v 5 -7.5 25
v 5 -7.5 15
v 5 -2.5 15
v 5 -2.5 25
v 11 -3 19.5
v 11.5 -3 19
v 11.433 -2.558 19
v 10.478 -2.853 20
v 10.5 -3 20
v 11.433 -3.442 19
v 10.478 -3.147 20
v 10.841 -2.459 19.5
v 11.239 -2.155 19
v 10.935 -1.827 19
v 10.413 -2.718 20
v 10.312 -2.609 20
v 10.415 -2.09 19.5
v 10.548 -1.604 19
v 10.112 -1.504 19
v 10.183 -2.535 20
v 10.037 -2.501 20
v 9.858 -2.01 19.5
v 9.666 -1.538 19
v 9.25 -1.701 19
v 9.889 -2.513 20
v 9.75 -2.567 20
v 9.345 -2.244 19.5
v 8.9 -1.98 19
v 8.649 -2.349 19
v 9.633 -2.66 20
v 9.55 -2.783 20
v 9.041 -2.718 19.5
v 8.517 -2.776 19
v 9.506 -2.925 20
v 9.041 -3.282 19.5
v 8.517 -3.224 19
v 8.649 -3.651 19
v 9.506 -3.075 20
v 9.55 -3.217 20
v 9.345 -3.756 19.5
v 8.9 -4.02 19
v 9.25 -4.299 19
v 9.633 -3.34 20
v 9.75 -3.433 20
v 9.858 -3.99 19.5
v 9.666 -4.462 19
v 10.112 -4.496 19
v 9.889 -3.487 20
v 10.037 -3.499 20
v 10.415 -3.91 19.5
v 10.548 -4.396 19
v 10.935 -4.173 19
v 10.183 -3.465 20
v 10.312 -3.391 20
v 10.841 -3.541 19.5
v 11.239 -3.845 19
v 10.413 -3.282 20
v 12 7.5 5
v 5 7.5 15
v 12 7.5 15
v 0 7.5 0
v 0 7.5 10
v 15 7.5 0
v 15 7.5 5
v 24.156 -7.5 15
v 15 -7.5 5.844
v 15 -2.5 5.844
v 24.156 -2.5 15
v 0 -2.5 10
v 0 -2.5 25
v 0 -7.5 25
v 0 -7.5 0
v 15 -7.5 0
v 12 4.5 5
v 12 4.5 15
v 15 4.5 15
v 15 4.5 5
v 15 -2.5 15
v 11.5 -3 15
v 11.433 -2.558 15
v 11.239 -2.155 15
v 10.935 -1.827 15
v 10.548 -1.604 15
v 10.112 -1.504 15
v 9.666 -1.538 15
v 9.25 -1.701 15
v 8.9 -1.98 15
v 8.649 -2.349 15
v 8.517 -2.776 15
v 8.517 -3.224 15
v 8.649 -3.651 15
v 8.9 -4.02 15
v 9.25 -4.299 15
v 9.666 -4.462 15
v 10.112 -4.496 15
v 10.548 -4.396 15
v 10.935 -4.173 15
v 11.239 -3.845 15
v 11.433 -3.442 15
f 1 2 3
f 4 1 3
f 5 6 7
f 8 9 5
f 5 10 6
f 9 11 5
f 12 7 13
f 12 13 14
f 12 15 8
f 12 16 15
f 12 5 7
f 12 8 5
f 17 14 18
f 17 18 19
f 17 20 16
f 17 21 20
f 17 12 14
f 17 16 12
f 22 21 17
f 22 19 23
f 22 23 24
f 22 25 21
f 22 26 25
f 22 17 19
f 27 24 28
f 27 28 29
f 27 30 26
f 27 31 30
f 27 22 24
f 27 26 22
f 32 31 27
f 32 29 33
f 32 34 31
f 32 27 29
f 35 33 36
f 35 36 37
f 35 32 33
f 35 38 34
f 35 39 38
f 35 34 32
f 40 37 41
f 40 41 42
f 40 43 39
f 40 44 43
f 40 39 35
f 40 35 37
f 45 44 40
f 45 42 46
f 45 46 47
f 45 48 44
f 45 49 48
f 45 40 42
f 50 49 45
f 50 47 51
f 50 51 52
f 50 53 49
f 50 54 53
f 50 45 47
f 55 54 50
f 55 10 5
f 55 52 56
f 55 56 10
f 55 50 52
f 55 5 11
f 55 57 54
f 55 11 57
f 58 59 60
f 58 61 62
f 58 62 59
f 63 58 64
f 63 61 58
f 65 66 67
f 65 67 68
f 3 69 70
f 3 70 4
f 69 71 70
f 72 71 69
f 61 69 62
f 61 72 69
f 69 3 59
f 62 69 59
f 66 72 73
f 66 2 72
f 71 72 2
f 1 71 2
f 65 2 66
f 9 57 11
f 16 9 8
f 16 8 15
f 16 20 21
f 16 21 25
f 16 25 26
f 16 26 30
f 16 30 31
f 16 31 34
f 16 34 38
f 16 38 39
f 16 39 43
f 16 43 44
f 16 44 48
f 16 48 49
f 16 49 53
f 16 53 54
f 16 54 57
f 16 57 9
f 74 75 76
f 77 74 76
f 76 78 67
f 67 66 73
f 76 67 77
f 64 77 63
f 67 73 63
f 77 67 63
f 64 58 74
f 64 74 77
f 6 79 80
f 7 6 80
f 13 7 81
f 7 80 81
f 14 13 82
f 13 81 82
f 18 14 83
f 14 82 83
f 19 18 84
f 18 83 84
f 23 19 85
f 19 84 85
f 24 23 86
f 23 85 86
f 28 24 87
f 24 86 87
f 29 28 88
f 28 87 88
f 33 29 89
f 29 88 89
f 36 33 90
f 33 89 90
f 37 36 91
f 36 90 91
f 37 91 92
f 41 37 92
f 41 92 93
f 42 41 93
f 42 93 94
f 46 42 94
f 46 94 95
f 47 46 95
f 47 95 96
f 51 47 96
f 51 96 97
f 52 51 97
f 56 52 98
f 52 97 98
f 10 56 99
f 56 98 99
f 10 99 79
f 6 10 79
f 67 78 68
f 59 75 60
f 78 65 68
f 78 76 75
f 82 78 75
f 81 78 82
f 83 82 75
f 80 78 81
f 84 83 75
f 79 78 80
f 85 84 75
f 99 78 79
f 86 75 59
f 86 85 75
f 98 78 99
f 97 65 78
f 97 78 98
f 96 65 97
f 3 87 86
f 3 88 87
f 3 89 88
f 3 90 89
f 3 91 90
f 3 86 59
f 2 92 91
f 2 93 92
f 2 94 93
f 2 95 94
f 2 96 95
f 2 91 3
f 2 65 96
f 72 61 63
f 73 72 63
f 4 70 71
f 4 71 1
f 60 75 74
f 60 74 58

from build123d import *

# Parameters (mm, degrees)
F0_W     = 15
F0_H     = 15
F1_DEPTH = 15
F2_W     = 5
F2_H     = 5
F3_DEPTH = 10
F2_R     = 1.5
F4_DEPTH = 5
F2_W_2   = 3
F2_H_2   = 3
F5_DEPTH = 10
F6_SIZE  = 5
F8_DEPTH = 5
F9_SIZE  = 1


with BuildPart() as f1:
    # F0 (on Top) → F1 (new body)
    with BuildSketch(Plane.XY):
        with Locations((7.5, 0)):
            Rectangle(F0_W, F0_H)
    extrude(amount=F1_DEPTH)

    # F2 (on face) → F3 (join)
    with BuildSketch(Plane.XY.offset(15)):
        with Locations((2.5, -5)):
            Rectangle(F2_W, F2_H)
    extrude(amount=F3_DEPTH)

    # F2 (on face) → F4 (join)
    with BuildSketch(Plane.XY.offset(15)):
        with Locations((10, -3)):
            Circle(F2_R)
    extrude(amount=F4_DEPTH)

    # F2 (on face) → F5 (cut)
    with BuildSketch(Plane.XY.offset(15)):
        with Locations((13.5, 6)):
            Rectangle(F2_W_2, F2_H_2)
    extrude(amount=-F5_DEPTH, mode=Mode.SUBTRACT)

    # F6
    f6_edges = [f1.edges().sort_by_distance(p)[0] for p in [
        (0, 2.5, 15),
    ]]
    chamfer(f6_edges, length=F6_SIZE)

    # F7 (on face) → F8 (join)
    with BuildSketch(Plane.XZ.offset(7.5)):
        Polygon((24.155803, 15), (15, 15), (15, 5.844197), align=None)
    extrude(amount=-F8_DEPTH)

    # F9
    f9_edges = [f1.edges().sort_by_distance(p)[0] for p in [
        (8.5, -3, 20),
    ]]
    chamfer(f9_edges, length=F9_SIZE)


solid = f1.part
